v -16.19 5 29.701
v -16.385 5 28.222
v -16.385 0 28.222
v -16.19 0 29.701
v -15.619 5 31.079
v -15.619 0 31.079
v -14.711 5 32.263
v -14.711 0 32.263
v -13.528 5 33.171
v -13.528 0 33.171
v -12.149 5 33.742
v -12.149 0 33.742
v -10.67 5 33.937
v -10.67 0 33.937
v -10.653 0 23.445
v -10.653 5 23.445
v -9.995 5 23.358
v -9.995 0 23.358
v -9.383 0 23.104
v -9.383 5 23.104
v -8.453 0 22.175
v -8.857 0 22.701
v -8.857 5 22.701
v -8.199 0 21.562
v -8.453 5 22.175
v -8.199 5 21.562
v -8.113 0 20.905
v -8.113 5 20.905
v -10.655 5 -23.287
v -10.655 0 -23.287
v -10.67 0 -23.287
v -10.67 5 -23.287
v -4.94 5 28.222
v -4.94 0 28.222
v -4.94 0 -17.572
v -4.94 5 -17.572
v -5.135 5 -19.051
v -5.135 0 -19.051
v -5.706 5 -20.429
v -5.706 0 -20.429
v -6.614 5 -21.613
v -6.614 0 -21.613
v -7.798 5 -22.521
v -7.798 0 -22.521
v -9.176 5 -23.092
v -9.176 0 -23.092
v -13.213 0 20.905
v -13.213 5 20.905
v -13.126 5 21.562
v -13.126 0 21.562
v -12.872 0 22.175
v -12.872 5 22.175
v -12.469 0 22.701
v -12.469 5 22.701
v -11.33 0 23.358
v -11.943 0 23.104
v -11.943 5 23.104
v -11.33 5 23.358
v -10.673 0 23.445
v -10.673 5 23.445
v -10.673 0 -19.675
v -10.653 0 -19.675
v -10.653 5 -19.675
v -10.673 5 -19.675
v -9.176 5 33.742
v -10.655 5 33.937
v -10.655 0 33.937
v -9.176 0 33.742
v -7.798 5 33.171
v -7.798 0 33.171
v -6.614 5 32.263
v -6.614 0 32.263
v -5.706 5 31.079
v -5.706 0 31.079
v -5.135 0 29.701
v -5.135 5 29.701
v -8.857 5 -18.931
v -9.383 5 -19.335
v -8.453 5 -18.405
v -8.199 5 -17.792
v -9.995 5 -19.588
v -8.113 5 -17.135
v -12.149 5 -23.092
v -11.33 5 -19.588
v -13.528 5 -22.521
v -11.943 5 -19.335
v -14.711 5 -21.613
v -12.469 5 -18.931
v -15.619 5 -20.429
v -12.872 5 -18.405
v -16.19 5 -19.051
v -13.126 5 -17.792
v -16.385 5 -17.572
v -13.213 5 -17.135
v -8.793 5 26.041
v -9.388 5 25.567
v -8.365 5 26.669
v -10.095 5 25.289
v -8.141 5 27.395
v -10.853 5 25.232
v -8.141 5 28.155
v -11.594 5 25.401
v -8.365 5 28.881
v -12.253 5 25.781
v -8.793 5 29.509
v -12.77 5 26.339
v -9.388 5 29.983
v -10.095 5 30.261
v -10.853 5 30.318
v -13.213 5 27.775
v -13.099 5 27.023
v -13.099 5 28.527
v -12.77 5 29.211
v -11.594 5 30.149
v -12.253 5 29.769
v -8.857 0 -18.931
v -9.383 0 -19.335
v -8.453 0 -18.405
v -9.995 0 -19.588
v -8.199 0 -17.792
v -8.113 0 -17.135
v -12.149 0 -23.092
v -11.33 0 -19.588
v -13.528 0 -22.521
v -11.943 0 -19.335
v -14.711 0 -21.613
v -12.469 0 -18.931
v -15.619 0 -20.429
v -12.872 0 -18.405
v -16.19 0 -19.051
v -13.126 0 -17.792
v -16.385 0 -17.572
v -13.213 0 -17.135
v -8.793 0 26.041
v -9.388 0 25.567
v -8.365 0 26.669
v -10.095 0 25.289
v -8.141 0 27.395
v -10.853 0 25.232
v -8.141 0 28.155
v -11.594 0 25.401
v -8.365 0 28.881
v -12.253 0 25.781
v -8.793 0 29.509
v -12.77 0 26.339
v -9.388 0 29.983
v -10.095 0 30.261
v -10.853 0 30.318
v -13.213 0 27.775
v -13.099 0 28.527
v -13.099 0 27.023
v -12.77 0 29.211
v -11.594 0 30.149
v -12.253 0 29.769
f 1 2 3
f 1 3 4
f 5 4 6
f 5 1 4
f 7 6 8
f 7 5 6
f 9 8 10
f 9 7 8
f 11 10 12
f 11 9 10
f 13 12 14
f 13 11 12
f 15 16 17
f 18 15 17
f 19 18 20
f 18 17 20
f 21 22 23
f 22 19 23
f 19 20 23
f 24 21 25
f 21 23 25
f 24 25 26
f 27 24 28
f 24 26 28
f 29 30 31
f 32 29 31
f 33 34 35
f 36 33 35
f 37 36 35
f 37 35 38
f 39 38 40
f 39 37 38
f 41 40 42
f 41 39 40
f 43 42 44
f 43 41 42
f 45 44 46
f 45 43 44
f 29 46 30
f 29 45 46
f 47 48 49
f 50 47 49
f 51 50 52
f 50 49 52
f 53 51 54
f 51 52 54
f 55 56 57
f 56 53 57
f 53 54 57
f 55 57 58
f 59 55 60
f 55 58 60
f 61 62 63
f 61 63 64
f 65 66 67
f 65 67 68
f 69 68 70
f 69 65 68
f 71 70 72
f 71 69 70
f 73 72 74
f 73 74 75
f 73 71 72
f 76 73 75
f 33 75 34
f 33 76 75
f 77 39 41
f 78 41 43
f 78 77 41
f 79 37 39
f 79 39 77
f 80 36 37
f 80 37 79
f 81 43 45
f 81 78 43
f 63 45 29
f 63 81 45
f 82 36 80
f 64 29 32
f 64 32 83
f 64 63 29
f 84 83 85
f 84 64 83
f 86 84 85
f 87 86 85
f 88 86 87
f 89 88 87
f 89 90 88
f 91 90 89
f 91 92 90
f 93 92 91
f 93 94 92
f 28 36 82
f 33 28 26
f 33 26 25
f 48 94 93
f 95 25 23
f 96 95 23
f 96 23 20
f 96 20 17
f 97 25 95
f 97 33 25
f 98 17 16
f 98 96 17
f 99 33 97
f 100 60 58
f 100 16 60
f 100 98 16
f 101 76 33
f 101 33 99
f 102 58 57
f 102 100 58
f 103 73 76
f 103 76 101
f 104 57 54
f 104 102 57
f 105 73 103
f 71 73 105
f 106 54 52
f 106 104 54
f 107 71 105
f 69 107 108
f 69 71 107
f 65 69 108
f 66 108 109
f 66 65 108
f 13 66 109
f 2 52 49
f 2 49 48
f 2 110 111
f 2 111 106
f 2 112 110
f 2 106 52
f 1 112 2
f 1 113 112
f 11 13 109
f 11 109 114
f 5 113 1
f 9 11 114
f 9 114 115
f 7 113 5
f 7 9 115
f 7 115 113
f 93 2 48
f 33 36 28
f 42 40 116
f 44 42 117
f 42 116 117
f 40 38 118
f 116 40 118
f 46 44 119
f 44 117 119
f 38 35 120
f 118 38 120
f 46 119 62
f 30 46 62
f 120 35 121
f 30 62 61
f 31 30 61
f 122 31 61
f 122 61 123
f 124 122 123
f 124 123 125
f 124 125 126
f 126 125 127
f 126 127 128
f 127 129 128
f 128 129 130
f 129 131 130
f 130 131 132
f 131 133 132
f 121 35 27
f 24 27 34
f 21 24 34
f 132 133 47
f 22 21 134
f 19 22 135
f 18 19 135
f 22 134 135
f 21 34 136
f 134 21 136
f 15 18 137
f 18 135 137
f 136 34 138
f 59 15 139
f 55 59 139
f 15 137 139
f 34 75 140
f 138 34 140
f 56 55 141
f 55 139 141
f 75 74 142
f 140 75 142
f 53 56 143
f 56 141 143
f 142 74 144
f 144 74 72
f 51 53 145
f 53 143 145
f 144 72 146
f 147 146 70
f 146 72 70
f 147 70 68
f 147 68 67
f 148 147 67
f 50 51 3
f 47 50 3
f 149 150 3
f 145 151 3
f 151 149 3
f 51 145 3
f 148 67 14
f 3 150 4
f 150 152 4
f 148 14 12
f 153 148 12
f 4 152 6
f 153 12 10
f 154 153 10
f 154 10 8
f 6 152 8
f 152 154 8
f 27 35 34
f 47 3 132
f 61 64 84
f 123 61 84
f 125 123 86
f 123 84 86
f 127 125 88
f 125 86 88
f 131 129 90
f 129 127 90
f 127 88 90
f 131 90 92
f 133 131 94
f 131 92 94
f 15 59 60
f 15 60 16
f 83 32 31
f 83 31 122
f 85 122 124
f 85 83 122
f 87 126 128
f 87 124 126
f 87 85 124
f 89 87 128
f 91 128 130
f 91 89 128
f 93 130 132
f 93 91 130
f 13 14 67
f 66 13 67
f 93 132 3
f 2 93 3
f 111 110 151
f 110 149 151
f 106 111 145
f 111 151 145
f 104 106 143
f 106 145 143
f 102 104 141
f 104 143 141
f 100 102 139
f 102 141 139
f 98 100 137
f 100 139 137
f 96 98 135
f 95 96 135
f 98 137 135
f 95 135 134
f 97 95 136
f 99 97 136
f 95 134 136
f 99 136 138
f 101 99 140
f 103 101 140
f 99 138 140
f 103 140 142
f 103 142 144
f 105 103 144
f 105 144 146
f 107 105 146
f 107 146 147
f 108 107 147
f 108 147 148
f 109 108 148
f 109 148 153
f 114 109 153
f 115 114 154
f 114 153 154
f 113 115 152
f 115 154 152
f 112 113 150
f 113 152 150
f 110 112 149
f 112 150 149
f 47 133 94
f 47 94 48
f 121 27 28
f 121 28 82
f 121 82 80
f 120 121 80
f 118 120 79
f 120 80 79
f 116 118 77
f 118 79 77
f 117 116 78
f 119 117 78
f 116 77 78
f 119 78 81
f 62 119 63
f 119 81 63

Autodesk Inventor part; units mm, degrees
ref_plane "YZ Plane" through (0, 0, 0) normal (1, 0, 0) x (0, 1, 0)
ref_plane "XZ Plane" through (0, 0, 0) normal (0, 1, 0) x (-1, 0, 0)
ref_plane "XY Plane" through (0, 0, 0) normal (0, 0, 1) x (1, 0, 0)
sketch "Sketch1" plane through (0, 0, 0) normal (0, 1, 0) x (-1, 0, 0)
  line L0 (16.3851, 33.9368) -> (4.9404, 33.9368)
  line L1 (4.9404, 33.9368) -> (4.9404, -23.2869)
  line L2 (4.9404, -23.2869) -> (16.3851, -23.2869)
  line L3 (16.3851, -23.2869) -> (16.3851, 33.9368)
  line L4 (13.2127, 30.325) -> (8.1127, 30.325)
  line L5 (8.1127, 30.325) -> (8.1127, -19.675)
  line L6 (8.1127, -19.675) -> (13.2127, -19.675)
  line L7 (13.2127, -19.675) -> (13.2127, 30.325)
  circle A0 centre (10.6627, 27.775) radius 2.55
  line L8 (13.2127, 23.4447) -> (8.1127, 23.4447)
  point P0 (0, 0)
  dimension "d2" = 5.1
  dimension "d3" = 11.4447
  dimension "d4" = 57.2237
  dimension "d5" = 3.1724
  dimension "d6" = 50
  dimension "d7" = 3.6118
  dimension "d12" = 5.1
  dimension "d13" = 2.55
extrude "Extrusion2" add sketch "Sketch1" along normal blind 5 contours L3 L2 L1 L0 | L7 A0 L4 | A0 L5 L4 | L7 L8 L5 A0
fillet "Fillet3" radius 5.715 4 edges at (-16.3851, 2.5, 33.9368) (-4.9404, 2.5, 33.9368) (-16.3851, 2.5, -23.2869) (-4.9404, 2.5, -23.2869)
fillet "Fillet4" radius 2.54 4 edges at (-13.2127, 2.5, 23.4447) (-8.1127, 2.5, 23.4447) (-8.1127, 2.5, -19.675) (-13.2127, 2.5, -19.675)
equation "\"d5\" = -0.5 * d2 + 0.5 * d3"
equation "\"d7\" = -0.5 * d6 + 0.5 * d4"
equation "\"d12\" = d2"
equation "\"d13\" = 0.5 * d2"
properties part number "extention_plate"
